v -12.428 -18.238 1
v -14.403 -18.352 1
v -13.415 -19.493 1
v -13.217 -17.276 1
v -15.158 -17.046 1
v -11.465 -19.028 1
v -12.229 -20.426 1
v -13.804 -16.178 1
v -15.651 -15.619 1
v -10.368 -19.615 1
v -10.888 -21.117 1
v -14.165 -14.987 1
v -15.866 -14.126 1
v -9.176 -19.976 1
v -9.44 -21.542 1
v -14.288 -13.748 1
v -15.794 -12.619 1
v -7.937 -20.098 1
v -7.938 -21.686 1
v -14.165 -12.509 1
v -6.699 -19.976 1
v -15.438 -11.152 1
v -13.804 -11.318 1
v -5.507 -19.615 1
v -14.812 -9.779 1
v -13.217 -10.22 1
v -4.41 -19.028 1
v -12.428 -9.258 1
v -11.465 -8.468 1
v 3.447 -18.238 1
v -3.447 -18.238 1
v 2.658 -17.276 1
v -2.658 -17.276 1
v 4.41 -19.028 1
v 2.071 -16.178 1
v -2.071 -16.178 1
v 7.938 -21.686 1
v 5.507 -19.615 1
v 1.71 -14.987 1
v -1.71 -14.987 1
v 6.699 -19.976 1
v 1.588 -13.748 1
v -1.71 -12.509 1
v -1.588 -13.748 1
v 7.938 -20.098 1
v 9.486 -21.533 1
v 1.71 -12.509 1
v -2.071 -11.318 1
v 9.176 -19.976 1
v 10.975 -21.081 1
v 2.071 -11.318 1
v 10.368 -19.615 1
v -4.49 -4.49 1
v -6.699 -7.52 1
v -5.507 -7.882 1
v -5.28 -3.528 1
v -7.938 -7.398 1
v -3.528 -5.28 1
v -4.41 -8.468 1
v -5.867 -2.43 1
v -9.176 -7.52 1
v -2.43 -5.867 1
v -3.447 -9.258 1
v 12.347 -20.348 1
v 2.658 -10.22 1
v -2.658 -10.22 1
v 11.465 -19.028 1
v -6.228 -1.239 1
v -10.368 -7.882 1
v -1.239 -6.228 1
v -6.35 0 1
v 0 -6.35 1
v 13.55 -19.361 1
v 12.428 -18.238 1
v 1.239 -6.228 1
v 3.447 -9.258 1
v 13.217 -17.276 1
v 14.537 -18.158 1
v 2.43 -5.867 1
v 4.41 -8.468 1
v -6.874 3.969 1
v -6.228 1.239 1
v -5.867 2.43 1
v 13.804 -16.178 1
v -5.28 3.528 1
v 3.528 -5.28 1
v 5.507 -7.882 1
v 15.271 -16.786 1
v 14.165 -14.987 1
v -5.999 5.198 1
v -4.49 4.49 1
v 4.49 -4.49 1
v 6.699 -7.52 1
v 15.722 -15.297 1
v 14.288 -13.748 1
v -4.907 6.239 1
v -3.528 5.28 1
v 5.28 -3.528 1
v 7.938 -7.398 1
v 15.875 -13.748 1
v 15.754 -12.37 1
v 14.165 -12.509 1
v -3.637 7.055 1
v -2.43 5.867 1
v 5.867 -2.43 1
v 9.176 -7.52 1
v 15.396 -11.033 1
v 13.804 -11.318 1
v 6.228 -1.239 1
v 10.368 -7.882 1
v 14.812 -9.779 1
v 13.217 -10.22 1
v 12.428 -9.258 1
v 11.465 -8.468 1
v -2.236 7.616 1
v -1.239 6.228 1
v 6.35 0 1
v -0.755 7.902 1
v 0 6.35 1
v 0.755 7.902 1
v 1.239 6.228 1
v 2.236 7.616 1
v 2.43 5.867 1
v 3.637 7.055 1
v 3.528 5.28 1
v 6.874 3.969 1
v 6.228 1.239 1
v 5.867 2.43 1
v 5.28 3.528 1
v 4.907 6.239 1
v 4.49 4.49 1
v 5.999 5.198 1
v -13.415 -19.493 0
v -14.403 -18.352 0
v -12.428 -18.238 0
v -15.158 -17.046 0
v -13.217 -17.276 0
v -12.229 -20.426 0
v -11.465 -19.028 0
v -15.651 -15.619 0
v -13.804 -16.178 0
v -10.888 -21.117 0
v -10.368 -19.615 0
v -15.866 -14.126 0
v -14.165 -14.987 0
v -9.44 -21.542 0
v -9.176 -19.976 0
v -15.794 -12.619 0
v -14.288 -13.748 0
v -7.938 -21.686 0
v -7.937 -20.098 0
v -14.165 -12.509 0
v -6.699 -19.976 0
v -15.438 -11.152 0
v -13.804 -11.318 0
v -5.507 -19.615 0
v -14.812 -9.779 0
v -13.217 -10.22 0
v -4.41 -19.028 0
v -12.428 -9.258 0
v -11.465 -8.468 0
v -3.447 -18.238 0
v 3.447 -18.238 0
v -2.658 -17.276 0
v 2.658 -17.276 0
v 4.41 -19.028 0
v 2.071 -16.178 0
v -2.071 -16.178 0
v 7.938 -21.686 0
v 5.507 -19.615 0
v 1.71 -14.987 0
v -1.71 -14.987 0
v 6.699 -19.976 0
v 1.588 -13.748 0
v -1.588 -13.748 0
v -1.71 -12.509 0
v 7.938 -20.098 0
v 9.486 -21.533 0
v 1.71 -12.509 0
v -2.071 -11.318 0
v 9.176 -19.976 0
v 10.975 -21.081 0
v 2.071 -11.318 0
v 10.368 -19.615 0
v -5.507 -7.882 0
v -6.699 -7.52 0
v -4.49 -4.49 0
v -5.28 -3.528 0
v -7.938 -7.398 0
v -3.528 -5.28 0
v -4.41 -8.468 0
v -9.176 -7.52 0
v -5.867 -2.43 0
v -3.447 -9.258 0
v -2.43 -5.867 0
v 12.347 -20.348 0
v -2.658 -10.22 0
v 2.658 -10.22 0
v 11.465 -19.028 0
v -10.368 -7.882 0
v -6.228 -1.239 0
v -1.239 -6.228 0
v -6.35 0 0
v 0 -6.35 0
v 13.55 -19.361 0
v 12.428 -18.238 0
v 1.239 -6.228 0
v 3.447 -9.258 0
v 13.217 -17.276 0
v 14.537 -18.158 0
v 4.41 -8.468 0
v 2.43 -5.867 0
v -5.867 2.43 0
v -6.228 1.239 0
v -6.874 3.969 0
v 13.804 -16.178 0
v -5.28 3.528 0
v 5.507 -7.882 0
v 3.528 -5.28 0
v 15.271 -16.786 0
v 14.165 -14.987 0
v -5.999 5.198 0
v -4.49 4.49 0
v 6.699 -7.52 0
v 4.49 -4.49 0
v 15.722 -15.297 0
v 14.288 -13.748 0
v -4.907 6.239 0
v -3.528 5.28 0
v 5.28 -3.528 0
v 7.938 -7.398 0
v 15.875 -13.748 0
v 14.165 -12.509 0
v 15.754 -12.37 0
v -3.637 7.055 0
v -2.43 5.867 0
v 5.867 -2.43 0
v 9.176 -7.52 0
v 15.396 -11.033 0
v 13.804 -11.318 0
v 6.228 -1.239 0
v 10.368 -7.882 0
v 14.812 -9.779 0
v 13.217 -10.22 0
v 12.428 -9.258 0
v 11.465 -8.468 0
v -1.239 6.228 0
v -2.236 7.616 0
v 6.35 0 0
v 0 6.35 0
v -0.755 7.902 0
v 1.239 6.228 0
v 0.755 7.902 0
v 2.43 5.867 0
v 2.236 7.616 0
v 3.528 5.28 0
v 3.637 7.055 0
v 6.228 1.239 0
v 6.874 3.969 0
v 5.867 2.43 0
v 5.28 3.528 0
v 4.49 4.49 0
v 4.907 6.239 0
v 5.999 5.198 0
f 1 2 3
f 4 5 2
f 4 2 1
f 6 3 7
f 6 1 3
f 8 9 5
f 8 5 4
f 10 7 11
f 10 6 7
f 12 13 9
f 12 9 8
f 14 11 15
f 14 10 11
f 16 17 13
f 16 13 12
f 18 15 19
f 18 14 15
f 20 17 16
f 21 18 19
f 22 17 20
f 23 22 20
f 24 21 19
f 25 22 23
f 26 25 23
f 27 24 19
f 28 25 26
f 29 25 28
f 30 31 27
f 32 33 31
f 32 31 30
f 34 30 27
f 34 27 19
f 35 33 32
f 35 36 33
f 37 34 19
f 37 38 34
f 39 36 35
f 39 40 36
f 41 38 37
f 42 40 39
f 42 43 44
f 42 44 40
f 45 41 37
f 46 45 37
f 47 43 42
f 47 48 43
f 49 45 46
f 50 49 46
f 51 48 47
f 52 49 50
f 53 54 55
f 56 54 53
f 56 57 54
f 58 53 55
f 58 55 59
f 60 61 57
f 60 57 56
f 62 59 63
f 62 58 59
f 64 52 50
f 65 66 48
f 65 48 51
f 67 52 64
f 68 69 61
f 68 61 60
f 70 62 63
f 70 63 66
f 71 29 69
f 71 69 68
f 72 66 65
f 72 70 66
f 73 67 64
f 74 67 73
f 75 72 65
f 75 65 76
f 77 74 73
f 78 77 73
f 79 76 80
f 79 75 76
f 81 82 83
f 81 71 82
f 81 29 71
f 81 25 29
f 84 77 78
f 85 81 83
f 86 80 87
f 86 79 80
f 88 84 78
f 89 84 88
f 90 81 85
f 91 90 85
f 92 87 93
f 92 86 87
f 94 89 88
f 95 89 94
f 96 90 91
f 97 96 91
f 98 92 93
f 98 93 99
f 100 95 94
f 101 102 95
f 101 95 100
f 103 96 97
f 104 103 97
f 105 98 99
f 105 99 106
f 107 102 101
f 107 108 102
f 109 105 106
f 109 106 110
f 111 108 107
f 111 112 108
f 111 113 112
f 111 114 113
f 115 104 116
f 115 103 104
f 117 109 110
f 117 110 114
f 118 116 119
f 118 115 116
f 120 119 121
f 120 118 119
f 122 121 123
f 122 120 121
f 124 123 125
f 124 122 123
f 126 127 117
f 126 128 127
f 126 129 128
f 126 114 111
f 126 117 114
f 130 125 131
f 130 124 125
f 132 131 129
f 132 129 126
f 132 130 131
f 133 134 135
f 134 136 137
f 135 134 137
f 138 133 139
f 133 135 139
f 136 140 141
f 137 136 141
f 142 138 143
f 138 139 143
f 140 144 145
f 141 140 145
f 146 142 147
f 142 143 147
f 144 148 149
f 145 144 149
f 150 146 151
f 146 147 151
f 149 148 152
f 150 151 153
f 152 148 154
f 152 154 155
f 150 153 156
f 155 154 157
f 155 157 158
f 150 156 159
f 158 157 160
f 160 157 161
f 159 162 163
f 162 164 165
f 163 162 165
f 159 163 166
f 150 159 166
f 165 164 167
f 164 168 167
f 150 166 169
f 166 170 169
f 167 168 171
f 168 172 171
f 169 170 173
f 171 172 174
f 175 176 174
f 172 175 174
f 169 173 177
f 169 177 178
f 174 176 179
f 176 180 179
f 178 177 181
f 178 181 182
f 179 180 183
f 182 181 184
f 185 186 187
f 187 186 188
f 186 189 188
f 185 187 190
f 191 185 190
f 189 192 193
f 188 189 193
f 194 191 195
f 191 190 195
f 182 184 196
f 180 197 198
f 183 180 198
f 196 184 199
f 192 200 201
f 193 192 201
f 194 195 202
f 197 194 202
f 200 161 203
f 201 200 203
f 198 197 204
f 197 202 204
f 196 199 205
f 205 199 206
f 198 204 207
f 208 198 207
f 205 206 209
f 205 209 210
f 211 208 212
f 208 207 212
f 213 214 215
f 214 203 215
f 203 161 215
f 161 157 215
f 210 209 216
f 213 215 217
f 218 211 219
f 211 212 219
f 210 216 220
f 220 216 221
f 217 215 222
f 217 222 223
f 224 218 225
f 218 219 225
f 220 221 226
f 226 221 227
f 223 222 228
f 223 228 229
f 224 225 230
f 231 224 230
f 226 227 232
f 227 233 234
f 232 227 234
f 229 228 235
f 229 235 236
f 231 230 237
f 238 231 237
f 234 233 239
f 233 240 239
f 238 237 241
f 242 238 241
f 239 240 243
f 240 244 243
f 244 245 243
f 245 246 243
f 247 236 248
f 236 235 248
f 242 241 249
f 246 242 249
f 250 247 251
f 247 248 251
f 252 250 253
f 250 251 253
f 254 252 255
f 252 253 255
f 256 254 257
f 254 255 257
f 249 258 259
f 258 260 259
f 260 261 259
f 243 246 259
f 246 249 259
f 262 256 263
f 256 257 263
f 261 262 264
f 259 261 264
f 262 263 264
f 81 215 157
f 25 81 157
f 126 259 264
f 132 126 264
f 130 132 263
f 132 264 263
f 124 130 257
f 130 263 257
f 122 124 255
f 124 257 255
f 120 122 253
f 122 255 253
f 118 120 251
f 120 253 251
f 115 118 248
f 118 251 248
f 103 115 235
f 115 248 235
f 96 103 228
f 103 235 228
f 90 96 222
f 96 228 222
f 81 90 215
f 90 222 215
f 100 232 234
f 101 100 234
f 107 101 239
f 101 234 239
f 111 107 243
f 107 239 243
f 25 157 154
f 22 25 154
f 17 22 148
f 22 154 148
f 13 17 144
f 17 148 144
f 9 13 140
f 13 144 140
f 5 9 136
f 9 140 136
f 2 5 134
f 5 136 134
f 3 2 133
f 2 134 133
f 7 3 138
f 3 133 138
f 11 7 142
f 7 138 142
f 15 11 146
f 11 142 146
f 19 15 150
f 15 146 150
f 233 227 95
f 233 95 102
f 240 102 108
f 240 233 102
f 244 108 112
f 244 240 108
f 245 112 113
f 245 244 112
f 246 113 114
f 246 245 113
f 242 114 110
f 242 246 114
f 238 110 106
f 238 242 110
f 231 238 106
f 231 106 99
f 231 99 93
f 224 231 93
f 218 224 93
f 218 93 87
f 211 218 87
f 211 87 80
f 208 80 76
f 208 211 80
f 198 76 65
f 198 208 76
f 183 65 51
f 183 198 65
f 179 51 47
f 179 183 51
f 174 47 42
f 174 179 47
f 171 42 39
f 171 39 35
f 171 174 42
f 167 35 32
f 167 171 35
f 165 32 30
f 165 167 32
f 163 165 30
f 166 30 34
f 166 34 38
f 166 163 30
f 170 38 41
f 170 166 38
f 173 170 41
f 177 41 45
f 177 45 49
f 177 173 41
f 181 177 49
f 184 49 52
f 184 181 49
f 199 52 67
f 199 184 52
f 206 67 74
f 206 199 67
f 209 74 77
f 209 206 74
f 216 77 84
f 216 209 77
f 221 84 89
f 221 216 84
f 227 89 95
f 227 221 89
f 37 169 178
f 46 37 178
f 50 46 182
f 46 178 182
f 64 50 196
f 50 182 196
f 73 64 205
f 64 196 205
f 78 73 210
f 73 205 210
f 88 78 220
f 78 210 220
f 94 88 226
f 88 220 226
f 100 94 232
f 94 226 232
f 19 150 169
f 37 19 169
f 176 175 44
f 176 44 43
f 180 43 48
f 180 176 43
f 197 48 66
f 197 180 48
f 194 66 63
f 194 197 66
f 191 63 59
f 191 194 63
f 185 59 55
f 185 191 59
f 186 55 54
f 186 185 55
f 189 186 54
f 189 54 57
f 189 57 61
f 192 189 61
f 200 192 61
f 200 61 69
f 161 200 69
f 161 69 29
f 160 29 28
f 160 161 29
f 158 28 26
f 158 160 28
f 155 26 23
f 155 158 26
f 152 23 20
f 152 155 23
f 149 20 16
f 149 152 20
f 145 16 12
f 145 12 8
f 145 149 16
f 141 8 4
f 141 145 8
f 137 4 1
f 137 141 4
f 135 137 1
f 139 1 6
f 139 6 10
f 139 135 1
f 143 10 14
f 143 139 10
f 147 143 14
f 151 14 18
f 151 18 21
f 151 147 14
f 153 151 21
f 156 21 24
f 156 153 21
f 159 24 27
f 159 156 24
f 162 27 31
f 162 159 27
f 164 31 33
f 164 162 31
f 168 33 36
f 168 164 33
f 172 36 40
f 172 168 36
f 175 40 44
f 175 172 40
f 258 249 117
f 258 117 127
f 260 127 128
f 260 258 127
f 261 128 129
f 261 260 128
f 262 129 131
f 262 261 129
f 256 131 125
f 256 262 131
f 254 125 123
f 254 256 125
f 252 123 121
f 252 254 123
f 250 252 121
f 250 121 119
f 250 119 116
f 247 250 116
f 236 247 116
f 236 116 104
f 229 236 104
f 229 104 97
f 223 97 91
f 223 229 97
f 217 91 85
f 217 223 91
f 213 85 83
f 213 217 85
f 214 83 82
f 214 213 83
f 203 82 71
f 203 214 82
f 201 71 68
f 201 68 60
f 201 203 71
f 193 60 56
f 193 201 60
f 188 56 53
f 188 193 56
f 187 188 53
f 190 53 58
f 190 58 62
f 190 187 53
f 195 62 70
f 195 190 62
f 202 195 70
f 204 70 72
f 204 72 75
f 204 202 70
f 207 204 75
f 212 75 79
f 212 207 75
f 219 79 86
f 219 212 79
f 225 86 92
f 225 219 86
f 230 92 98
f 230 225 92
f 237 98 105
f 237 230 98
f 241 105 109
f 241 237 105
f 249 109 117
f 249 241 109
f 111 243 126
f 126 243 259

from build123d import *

# Parameters (mm, degrees)
F0_R     = 6.35
F1_DEPTH = 1


with BuildPart() as f1:
    # F0 (on Top) → F1 (new body)
    with BuildSketch(Plane.XY):
        with BuildLine():
            ThreePointArc((-3.9687500424, -6.8740766181), (-7.6670362525, -2.0543761469), (-6.8740766425, 3.96875))
            Line((-6.8740766425, 3.96875), (-14.8115766425, -9.7794032851))
            ThreePointArc((-14.8115766425, -9.7794032851), (-9.9918761941, -6.0811170452), (-3.9687500424, -6.8740766181))
        make_face()
        with BuildLine():
            ThreePointArc((0, -13.7481532851), (-1.0634233697, -9.7794032639), (-3.9687500424, -6.8740766181))
            ThreePointArc((-3.9687500424, -6.8740766181), (-9.9918761941, -6.0811170452), (-14.8115766425, -9.7794032851))
            ThreePointArc((-14.8115766425, -9.7794032851), (-14.8115766425, -17.7169032851), (-7.9375, -21.6856532851))
            ThreePointArc((-7.9375, -21.6856532851), (-2.3248399243, -19.3608133607), (0, -13.7481532851))
        make_face()
        with Locations((-7.9375, -13.7481532851)):
            Circle(F0_R, mode=Mode.SUBTRACT)
        with BuildLine():
            ThreePointArc((7.9375, -21.6856532851), (2.3248399243, -19.3608133607), (0, -13.7481532851))
            ThreePointArc((0, -13.7481532851), (-2.3248399243, -19.3608133607), (-7.9375, -21.6856532851))
            Line((-7.9375, -21.6856532851), (7.9375, -21.6856532851))
        make_face()
        with BuildLine():
            ThreePointArc((14.8115766425, -9.7794032851), (9.9918761512, -6.0811170337), (3.9687499653, -6.8740766625))
            ThreePointArc((3.9687499653, -6.8740766625), (1.0634233475, -9.7794033024), (0, -13.7481532851))
            ThreePointArc((0, -13.7481532851), (2.3248399243, -19.3608133607), (7.9375, -21.6856532851))
            ThreePointArc((7.9375, -21.6856532851), (13.5501600757, -19.3608133607), (15.875, -13.7481532851))
            ThreePointArc((15.875, -13.7481532851), (15.6045362462, -11.6937771146), (14.8115766425, -9.7794032851))
        make_face()
        with Locations((7.9375, -13.7481532851)):
            Circle(F0_R, mode=Mode.SUBTRACT)
        with BuildLine():
            ThreePointArc((6.8740766425, 3.96875), (7.6670362462, 2.0543761705), (7.9375, 0))
            ThreePointArc((7.9375, 0), (6.8740766325, -3.9687500173), (3.9687499653, -6.8740766625))
            ThreePointArc((3.9687499653, -6.8740766625), (9.9918761512, -6.0811170337), (14.8115766425, -9.7794032851))
            Line((14.8115766425, -9.7794032851), (6.8740766425, 3.96875))
        make_face()
        with BuildLine():
            ThreePointArc((0, -13.7481532851), (1.0634233475, -9.7794033024), (3.9687499653, -6.8740766625))
            ThreePointArc((3.9687499653, -6.8740766625), (-4.45e-08, -7.9375), (-3.9687500424, -6.8740766181))
            ThreePointArc((-3.9687500424, -6.8740766181), (-1.0634233697, -9.7794032639), (0, -13.7481532851))
        make_face()
        with BuildLine():
            ThreePointArc((3.9687499653, -6.8740766625), (6.8740766325, -3.9687500173), (7.9375, 0))
            ThreePointArc((7.9375, 0), (7.6670362462, 2.0543761705), (6.8740766425, 3.96875))
            ThreePointArc((6.8740766425, 3.96875), (0, 7.9375), (-6.8740766425, 3.96875))
            ThreePointArc((-6.8740766425, 3.96875), (-7.6670362525, -2.0543761469), (-3.9687500424, -6.8740766181))
            ThreePointArc((-3.9687500424, -6.8740766181), (-4.45e-08, -7.9375), (3.9687499653, -6.8740766625))
        make_face()
        Circle(F0_R, mode=Mode.SUBTRACT)
    extrude(amount=F1_DEPTH)


solid = f1.part
